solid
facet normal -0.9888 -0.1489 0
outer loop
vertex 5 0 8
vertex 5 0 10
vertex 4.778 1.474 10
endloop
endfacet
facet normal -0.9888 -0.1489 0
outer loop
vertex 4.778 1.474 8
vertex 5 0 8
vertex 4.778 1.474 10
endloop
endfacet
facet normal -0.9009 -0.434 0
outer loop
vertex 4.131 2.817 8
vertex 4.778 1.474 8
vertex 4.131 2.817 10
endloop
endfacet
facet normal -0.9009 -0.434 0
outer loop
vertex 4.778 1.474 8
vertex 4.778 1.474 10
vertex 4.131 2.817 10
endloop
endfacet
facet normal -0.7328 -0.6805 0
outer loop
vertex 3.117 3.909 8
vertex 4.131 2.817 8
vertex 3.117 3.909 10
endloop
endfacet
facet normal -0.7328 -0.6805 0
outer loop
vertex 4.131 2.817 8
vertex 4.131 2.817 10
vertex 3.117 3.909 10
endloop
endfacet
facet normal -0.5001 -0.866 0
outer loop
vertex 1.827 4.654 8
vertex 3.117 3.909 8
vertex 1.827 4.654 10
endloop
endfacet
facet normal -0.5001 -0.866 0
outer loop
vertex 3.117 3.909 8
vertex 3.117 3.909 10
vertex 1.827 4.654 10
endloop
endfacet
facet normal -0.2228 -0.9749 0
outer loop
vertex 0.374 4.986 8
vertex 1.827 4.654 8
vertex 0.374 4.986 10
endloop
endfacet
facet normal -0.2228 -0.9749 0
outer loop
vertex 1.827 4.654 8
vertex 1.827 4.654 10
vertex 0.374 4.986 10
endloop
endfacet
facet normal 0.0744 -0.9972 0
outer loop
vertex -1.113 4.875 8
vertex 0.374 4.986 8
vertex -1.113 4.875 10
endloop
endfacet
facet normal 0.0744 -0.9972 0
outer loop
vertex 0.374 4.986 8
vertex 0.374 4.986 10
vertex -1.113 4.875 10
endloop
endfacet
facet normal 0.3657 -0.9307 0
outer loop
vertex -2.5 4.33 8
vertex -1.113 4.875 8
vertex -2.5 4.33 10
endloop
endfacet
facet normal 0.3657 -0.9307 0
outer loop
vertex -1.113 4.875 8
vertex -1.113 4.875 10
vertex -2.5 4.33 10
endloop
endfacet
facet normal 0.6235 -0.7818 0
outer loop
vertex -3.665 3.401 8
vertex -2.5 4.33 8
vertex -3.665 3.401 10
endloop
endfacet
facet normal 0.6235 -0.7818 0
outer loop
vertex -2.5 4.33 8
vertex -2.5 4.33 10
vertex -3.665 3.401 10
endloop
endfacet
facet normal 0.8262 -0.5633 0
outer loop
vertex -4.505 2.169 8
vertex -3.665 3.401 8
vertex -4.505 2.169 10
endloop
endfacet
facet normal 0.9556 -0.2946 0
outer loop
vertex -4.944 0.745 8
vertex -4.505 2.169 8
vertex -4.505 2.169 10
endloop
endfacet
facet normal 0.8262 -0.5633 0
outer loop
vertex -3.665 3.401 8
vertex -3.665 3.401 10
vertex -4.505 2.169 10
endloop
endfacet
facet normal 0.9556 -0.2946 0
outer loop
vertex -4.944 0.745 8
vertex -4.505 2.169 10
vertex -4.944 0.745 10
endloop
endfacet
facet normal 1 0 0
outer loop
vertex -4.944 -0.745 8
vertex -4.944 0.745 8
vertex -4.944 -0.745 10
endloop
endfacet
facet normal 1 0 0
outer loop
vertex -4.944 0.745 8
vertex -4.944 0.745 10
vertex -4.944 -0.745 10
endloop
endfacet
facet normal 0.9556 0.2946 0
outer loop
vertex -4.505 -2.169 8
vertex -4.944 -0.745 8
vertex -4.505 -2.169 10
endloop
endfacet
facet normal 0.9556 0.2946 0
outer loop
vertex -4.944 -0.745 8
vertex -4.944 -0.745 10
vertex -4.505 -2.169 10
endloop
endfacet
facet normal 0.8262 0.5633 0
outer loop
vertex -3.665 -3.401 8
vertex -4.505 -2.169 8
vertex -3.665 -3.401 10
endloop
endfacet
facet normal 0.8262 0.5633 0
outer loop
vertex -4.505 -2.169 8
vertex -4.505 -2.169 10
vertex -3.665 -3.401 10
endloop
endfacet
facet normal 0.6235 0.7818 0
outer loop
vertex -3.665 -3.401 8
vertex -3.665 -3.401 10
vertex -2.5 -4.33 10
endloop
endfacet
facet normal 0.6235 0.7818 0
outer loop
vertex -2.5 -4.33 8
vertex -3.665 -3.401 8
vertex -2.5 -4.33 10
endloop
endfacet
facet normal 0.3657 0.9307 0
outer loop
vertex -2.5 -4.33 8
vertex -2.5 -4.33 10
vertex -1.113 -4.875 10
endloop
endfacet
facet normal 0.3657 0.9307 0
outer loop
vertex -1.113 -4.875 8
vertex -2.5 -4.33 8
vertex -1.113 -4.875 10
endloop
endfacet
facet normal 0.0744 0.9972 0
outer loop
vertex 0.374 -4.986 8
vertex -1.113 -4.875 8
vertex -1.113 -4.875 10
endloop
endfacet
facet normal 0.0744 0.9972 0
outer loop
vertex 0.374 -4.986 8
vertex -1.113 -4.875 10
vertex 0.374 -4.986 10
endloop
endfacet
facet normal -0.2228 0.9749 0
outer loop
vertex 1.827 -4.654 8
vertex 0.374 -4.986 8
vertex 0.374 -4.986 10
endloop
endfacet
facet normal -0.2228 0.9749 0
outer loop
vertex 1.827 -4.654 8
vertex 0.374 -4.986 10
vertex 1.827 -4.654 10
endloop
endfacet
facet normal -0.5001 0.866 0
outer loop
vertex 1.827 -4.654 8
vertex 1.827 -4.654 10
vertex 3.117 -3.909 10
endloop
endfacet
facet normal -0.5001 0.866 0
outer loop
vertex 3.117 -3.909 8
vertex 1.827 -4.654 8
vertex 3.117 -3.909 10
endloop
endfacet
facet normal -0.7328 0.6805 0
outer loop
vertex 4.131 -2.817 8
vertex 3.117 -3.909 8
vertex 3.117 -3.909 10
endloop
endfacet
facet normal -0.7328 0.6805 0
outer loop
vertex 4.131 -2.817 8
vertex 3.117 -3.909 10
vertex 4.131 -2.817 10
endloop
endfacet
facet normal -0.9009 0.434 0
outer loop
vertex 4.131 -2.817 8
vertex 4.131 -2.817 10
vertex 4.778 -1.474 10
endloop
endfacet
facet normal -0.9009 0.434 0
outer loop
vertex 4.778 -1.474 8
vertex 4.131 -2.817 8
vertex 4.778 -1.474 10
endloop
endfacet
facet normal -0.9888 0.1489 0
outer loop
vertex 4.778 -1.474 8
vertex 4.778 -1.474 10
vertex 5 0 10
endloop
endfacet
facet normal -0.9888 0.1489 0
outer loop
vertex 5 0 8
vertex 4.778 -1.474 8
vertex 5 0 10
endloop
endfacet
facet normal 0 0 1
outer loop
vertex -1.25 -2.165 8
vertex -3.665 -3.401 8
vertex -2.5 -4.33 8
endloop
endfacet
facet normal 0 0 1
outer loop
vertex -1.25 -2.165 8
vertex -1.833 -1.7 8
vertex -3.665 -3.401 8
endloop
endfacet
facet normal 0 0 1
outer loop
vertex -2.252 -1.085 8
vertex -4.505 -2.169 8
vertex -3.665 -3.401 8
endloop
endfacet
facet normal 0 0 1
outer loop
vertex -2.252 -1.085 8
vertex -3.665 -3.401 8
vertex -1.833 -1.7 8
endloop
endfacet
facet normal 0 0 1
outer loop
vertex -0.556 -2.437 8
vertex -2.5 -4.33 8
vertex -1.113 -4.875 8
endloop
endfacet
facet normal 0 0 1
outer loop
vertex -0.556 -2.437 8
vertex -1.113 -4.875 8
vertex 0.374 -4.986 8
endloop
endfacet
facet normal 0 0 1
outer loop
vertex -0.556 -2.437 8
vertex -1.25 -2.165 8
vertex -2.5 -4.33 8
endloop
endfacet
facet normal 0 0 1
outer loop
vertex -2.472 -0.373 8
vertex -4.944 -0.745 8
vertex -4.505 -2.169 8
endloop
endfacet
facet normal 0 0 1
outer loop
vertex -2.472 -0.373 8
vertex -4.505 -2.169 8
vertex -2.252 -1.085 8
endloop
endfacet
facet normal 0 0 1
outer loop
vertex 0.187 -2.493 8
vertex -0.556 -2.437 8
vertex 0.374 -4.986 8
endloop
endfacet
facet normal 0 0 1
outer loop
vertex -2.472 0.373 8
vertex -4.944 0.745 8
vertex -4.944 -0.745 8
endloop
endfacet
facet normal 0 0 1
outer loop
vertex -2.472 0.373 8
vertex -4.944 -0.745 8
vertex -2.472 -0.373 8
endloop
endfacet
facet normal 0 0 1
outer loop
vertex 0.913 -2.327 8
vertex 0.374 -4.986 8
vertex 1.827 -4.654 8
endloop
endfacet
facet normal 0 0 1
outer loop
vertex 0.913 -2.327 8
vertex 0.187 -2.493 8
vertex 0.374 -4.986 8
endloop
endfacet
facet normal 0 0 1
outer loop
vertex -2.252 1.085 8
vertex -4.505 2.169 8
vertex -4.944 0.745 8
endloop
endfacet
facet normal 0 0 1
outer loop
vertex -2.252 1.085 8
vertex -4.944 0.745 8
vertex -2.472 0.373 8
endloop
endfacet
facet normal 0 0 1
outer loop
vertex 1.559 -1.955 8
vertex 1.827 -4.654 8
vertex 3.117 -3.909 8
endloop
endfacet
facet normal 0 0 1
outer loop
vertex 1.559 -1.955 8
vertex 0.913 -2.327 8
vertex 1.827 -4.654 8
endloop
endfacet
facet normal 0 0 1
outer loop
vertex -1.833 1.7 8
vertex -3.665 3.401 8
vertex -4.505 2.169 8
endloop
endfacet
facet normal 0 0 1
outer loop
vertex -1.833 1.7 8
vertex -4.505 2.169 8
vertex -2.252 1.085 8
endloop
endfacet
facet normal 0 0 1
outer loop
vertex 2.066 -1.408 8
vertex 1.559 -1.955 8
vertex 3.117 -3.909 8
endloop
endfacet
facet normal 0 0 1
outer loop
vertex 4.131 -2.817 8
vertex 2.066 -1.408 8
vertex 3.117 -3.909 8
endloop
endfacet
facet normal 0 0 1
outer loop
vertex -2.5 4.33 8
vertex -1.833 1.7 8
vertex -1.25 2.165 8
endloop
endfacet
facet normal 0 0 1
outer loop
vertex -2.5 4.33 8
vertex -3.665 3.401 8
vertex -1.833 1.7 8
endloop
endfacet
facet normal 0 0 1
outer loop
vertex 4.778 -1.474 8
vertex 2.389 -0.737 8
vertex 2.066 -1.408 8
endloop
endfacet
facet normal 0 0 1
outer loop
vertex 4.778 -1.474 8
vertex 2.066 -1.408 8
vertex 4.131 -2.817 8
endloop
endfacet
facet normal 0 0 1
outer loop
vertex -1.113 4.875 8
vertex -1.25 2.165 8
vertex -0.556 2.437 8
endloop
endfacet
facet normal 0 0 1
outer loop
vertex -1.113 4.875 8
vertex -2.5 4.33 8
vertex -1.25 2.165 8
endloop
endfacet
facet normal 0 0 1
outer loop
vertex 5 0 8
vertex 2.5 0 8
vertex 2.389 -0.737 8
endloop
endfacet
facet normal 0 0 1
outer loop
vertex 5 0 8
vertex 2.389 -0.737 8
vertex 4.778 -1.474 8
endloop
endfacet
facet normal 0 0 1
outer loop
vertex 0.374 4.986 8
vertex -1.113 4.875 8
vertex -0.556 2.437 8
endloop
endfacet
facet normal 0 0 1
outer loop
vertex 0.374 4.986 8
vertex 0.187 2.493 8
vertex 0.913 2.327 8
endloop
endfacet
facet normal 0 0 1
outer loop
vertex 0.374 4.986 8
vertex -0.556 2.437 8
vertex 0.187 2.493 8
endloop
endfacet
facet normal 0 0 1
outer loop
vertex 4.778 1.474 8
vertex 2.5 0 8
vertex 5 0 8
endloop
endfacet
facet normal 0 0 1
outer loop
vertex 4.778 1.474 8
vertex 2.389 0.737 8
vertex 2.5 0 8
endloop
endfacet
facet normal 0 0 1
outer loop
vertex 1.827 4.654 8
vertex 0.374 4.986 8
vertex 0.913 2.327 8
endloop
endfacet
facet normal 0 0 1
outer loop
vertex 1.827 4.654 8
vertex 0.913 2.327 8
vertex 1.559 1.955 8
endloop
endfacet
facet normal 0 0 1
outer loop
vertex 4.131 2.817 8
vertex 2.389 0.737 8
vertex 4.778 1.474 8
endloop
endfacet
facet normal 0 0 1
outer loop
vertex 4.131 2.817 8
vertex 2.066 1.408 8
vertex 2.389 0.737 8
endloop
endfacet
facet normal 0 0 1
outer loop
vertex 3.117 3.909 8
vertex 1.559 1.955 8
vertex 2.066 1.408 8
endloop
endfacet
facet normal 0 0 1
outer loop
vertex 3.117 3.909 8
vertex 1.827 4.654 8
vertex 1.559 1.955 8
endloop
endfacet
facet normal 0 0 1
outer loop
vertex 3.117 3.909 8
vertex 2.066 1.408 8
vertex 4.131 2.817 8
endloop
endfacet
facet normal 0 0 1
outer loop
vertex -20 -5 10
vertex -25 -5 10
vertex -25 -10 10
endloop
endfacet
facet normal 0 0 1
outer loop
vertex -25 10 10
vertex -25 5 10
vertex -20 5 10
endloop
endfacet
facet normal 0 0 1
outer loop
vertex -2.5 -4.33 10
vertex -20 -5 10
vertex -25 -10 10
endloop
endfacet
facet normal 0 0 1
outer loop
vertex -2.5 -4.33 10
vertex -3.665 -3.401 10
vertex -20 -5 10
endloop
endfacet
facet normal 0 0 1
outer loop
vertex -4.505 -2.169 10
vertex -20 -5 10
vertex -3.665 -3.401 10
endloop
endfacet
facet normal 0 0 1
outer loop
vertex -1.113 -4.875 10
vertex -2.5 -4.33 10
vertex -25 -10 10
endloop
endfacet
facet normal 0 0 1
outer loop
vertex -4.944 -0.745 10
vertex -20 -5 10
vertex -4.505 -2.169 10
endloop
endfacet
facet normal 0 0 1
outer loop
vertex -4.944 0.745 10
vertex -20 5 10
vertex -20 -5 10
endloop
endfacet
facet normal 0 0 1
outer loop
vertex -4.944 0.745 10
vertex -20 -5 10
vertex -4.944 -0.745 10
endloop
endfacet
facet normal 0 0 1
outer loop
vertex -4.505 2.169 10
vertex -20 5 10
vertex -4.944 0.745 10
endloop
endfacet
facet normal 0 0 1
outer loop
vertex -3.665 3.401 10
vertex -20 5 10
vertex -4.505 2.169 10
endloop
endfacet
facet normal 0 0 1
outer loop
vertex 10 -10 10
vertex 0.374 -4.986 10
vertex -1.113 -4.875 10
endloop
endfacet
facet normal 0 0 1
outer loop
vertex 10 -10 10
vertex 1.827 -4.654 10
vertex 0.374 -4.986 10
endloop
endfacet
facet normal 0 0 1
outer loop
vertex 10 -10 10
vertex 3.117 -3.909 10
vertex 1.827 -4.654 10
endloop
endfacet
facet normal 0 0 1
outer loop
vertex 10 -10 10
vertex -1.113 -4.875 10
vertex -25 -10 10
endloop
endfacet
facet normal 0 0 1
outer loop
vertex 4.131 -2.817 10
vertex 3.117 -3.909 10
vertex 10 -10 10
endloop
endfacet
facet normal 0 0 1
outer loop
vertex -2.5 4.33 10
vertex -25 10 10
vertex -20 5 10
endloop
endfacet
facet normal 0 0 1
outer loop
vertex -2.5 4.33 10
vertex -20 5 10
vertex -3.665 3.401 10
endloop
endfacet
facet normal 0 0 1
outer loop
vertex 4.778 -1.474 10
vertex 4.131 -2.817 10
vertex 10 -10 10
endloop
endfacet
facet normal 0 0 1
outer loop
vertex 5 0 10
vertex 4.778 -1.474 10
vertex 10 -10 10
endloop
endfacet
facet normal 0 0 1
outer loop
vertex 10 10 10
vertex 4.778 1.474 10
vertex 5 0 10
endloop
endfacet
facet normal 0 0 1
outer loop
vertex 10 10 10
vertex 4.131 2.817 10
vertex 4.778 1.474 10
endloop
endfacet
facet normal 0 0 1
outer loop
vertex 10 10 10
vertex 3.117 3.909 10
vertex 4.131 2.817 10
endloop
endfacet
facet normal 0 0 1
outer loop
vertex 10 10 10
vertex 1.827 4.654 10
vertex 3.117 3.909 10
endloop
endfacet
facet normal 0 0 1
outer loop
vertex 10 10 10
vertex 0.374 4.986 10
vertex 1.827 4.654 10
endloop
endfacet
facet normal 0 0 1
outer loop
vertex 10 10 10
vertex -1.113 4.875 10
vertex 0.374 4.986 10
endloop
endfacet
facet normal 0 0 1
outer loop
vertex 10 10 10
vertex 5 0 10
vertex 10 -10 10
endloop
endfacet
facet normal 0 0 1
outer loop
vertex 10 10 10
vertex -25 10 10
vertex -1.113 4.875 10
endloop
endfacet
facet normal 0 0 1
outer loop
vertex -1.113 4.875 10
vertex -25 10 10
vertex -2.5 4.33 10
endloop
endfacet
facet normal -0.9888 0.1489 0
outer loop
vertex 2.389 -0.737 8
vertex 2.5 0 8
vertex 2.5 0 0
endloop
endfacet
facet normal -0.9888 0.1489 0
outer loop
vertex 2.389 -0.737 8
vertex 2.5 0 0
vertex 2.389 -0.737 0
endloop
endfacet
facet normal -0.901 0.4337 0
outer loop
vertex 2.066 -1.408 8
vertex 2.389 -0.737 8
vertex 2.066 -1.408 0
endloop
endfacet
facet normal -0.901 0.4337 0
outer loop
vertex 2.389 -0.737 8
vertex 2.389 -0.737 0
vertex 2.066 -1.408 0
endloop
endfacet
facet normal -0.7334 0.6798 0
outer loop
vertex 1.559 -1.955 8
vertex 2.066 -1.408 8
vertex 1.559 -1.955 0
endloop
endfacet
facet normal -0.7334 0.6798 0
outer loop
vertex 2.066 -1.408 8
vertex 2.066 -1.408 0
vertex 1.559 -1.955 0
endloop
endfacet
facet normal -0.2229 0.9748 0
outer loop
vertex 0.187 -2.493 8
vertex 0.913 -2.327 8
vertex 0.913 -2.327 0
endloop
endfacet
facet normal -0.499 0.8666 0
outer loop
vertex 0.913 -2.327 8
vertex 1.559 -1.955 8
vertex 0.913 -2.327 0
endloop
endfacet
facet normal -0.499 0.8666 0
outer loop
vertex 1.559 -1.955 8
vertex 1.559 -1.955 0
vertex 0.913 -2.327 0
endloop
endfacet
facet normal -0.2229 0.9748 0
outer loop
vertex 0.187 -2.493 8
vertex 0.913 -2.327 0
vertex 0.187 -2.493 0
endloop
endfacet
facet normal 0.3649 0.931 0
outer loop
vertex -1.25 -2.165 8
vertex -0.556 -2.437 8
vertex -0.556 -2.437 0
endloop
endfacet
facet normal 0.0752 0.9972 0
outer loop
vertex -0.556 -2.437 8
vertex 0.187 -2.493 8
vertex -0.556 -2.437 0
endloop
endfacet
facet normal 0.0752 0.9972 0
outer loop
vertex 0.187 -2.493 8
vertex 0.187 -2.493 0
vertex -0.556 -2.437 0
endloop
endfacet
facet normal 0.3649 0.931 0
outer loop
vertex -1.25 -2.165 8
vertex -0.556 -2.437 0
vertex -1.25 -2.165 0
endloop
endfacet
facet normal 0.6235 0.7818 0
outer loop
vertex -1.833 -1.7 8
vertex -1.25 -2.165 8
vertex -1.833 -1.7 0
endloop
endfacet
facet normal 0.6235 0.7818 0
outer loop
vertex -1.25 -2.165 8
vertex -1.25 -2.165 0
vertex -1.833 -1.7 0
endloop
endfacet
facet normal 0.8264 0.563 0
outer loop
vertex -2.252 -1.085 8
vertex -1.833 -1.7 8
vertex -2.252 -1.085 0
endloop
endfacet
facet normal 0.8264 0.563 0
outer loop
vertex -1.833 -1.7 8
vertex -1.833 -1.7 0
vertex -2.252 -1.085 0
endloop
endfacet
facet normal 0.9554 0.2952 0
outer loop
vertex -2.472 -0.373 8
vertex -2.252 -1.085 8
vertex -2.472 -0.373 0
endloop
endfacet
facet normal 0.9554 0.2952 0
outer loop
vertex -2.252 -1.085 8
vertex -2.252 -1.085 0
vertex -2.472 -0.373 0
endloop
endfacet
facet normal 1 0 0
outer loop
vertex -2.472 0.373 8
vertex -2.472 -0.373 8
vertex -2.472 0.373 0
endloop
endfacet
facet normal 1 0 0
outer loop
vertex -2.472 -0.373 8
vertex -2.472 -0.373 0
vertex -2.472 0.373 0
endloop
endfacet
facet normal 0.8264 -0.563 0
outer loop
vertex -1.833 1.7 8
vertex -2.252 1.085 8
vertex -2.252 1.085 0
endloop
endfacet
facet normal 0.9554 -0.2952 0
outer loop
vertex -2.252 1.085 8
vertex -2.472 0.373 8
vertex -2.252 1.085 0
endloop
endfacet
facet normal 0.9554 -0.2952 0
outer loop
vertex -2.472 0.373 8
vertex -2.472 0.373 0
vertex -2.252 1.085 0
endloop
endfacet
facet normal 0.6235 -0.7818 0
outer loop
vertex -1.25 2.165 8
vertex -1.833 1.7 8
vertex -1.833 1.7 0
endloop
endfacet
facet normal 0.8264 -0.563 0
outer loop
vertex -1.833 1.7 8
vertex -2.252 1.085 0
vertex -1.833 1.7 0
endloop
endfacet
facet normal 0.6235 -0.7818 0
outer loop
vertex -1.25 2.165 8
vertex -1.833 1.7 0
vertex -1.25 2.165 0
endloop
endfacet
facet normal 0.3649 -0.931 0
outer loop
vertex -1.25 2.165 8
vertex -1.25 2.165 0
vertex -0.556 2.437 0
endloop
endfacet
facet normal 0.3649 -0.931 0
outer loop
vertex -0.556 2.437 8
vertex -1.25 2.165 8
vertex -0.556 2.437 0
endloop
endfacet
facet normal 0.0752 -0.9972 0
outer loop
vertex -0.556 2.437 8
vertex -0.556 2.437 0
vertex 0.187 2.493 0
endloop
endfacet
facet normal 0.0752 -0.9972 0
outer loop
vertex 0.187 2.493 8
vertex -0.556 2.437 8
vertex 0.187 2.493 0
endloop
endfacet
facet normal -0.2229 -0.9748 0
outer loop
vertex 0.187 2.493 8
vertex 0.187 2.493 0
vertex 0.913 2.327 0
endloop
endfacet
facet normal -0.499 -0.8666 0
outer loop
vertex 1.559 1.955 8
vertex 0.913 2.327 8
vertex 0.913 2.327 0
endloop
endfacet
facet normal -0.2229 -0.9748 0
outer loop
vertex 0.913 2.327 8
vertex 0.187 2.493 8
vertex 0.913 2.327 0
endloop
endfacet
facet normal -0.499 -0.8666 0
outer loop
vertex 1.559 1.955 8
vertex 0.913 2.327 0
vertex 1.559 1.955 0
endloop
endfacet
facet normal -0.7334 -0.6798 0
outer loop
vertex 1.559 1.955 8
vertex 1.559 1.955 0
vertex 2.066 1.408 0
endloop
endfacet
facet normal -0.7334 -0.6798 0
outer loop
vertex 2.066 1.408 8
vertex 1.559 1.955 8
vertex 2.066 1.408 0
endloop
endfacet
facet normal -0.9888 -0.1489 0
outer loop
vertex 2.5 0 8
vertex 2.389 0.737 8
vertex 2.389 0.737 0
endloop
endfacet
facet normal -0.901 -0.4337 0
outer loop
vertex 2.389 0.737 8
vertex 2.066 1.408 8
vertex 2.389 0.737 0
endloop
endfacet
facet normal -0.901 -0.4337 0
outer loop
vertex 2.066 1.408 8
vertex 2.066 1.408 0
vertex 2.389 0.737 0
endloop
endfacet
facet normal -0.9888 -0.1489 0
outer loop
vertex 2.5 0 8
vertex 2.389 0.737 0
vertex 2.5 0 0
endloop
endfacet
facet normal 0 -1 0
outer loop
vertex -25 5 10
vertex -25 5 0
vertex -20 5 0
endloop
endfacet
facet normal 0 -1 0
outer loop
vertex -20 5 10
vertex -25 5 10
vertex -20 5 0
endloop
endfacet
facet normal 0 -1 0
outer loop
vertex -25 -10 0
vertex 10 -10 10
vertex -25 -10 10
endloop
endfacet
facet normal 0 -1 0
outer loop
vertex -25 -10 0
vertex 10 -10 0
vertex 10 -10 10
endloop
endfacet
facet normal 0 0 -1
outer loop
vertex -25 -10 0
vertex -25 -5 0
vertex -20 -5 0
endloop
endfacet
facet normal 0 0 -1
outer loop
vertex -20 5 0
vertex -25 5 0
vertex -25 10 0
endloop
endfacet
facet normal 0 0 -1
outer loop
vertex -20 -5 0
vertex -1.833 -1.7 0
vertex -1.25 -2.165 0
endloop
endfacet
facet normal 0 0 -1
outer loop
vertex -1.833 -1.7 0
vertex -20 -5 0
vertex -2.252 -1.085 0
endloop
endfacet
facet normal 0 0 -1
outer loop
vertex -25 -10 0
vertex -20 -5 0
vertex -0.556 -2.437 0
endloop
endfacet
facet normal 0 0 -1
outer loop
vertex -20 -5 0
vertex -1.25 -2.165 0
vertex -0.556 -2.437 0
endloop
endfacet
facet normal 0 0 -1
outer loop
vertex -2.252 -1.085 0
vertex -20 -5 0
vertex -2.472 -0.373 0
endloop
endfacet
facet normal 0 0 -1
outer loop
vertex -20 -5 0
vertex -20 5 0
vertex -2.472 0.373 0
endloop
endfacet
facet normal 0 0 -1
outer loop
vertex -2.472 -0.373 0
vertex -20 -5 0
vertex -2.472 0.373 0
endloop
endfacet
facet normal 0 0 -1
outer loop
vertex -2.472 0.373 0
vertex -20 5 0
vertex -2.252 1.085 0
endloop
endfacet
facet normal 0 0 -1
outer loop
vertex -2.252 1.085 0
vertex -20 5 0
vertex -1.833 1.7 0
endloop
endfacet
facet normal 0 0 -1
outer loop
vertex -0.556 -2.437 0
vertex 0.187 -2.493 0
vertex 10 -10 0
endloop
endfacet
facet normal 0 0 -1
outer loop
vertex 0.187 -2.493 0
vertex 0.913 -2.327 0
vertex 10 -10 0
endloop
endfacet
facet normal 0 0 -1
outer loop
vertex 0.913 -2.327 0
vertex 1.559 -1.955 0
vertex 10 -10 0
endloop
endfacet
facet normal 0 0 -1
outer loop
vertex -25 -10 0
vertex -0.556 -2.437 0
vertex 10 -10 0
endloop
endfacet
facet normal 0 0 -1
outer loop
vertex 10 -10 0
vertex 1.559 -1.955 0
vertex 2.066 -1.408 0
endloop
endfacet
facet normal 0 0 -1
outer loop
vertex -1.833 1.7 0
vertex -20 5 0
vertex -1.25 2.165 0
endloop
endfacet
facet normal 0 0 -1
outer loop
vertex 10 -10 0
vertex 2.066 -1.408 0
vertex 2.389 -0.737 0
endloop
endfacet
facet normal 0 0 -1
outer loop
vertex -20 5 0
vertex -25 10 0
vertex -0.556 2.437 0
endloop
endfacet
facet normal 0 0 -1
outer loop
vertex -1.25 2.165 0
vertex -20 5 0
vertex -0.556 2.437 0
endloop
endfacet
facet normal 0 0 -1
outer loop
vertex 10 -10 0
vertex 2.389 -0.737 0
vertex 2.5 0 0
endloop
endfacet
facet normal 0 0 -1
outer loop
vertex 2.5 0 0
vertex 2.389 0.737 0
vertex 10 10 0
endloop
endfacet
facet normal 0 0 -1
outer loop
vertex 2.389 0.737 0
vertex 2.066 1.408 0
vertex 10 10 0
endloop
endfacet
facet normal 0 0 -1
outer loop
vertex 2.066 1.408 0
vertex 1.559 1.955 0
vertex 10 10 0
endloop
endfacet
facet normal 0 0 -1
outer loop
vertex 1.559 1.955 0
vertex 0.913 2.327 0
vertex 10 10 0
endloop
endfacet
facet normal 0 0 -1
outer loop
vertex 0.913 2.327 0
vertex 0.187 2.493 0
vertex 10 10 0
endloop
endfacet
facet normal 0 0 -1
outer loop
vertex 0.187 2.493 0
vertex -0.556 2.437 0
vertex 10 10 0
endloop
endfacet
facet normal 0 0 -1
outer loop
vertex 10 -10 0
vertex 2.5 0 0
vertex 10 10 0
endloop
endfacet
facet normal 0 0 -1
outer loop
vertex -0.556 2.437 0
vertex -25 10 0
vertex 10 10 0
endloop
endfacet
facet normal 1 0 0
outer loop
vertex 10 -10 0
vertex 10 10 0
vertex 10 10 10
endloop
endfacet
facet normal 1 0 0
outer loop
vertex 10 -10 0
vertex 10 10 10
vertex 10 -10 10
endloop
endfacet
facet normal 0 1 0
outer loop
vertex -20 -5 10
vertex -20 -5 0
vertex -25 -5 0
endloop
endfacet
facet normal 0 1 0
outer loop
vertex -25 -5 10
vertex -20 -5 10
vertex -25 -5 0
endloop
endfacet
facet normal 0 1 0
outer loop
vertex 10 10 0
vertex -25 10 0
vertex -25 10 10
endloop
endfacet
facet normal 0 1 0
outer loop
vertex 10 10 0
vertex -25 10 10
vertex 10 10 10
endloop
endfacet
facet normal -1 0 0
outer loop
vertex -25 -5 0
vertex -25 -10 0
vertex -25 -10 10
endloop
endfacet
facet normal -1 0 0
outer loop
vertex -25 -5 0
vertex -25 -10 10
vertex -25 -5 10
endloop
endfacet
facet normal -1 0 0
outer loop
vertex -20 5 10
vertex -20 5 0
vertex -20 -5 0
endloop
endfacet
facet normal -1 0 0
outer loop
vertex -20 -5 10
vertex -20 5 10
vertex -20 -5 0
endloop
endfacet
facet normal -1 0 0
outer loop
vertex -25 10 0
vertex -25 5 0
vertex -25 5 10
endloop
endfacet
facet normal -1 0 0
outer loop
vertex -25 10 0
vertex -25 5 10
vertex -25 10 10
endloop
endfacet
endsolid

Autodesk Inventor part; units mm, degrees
ref_plane "YZ Plane" through (0, 0, 0) normal (1, 0, 0) x (0, 1, 0)
ref_plane "XZ Plane" through (0, 0, 0) normal (0, 1, 0) x (-1, 0, 0)
ref_plane "XY Plane" through (0, 0, 0) normal (0, 0, 1) x (1, 0, 0)
sketch "Sketch1" plane through (0, 0, 0) normal (0, 0, 1) x (1, 0, 0)
  line L0 (-25, 10) -> (10, 10)
  line L1 (10, 10) -> (10, -10)
  line L2 (10, -10) -> (-25, -10)
  line L3 (-25, 5) -> (-20, 5)
  line L4 (-20, 5) -> (-20, -5)
  line L5 (-20, -5) -> (-25, -5)
  line L6 (-25, -10) -> (-25, -5)
  line L7 (-25, 5) -> (-25, 10)
  circle A0 centre (0, 0) radius 2.5
  point P0 (10, 0)
  dimension "d0" = 5
  dimension "d1" = 10
  dimension "d2" = 5
  dimension "d3" = 5
  dimension "d4" = 5
  dimension "d5" = 35
  dimension "d7" = 10
  dimension "d8" = 5
extrude "Extrusion1" add sketch "Sketch1" along normal blind 10
sketch "Sketch2" plane through (0, 0, 10) normal (0, 0, 1) x (1, 0, 0)
  circle A0 centre (0, 0) radius 2.5 projected
  circle A1 centre (0, 0) radius 5
  dimension "d11" = 10
extrude "Extrusion2" cut sketch "Sketch2" against normal blind 2
equation "\"BendRadius\" = Thickness"
equation "\"BendReliefWidth\" = Thickness"
equation "\"BendReliefDepth\" = 0.5 * Thickness"
equation "\"CornerReliefSize\" = 4 * Thickness"
equation "\"MinimumRemnant\" = 2 * Thickness"
equation "\"TransitionRadius\" = BendRadius"
equation "\"JacobiRadiusSize\" = BendRadius"
equation "\"GapSize\" = Thickness"
equation "\"Thickness\" = 0.5"
properties part number "lesson1"
